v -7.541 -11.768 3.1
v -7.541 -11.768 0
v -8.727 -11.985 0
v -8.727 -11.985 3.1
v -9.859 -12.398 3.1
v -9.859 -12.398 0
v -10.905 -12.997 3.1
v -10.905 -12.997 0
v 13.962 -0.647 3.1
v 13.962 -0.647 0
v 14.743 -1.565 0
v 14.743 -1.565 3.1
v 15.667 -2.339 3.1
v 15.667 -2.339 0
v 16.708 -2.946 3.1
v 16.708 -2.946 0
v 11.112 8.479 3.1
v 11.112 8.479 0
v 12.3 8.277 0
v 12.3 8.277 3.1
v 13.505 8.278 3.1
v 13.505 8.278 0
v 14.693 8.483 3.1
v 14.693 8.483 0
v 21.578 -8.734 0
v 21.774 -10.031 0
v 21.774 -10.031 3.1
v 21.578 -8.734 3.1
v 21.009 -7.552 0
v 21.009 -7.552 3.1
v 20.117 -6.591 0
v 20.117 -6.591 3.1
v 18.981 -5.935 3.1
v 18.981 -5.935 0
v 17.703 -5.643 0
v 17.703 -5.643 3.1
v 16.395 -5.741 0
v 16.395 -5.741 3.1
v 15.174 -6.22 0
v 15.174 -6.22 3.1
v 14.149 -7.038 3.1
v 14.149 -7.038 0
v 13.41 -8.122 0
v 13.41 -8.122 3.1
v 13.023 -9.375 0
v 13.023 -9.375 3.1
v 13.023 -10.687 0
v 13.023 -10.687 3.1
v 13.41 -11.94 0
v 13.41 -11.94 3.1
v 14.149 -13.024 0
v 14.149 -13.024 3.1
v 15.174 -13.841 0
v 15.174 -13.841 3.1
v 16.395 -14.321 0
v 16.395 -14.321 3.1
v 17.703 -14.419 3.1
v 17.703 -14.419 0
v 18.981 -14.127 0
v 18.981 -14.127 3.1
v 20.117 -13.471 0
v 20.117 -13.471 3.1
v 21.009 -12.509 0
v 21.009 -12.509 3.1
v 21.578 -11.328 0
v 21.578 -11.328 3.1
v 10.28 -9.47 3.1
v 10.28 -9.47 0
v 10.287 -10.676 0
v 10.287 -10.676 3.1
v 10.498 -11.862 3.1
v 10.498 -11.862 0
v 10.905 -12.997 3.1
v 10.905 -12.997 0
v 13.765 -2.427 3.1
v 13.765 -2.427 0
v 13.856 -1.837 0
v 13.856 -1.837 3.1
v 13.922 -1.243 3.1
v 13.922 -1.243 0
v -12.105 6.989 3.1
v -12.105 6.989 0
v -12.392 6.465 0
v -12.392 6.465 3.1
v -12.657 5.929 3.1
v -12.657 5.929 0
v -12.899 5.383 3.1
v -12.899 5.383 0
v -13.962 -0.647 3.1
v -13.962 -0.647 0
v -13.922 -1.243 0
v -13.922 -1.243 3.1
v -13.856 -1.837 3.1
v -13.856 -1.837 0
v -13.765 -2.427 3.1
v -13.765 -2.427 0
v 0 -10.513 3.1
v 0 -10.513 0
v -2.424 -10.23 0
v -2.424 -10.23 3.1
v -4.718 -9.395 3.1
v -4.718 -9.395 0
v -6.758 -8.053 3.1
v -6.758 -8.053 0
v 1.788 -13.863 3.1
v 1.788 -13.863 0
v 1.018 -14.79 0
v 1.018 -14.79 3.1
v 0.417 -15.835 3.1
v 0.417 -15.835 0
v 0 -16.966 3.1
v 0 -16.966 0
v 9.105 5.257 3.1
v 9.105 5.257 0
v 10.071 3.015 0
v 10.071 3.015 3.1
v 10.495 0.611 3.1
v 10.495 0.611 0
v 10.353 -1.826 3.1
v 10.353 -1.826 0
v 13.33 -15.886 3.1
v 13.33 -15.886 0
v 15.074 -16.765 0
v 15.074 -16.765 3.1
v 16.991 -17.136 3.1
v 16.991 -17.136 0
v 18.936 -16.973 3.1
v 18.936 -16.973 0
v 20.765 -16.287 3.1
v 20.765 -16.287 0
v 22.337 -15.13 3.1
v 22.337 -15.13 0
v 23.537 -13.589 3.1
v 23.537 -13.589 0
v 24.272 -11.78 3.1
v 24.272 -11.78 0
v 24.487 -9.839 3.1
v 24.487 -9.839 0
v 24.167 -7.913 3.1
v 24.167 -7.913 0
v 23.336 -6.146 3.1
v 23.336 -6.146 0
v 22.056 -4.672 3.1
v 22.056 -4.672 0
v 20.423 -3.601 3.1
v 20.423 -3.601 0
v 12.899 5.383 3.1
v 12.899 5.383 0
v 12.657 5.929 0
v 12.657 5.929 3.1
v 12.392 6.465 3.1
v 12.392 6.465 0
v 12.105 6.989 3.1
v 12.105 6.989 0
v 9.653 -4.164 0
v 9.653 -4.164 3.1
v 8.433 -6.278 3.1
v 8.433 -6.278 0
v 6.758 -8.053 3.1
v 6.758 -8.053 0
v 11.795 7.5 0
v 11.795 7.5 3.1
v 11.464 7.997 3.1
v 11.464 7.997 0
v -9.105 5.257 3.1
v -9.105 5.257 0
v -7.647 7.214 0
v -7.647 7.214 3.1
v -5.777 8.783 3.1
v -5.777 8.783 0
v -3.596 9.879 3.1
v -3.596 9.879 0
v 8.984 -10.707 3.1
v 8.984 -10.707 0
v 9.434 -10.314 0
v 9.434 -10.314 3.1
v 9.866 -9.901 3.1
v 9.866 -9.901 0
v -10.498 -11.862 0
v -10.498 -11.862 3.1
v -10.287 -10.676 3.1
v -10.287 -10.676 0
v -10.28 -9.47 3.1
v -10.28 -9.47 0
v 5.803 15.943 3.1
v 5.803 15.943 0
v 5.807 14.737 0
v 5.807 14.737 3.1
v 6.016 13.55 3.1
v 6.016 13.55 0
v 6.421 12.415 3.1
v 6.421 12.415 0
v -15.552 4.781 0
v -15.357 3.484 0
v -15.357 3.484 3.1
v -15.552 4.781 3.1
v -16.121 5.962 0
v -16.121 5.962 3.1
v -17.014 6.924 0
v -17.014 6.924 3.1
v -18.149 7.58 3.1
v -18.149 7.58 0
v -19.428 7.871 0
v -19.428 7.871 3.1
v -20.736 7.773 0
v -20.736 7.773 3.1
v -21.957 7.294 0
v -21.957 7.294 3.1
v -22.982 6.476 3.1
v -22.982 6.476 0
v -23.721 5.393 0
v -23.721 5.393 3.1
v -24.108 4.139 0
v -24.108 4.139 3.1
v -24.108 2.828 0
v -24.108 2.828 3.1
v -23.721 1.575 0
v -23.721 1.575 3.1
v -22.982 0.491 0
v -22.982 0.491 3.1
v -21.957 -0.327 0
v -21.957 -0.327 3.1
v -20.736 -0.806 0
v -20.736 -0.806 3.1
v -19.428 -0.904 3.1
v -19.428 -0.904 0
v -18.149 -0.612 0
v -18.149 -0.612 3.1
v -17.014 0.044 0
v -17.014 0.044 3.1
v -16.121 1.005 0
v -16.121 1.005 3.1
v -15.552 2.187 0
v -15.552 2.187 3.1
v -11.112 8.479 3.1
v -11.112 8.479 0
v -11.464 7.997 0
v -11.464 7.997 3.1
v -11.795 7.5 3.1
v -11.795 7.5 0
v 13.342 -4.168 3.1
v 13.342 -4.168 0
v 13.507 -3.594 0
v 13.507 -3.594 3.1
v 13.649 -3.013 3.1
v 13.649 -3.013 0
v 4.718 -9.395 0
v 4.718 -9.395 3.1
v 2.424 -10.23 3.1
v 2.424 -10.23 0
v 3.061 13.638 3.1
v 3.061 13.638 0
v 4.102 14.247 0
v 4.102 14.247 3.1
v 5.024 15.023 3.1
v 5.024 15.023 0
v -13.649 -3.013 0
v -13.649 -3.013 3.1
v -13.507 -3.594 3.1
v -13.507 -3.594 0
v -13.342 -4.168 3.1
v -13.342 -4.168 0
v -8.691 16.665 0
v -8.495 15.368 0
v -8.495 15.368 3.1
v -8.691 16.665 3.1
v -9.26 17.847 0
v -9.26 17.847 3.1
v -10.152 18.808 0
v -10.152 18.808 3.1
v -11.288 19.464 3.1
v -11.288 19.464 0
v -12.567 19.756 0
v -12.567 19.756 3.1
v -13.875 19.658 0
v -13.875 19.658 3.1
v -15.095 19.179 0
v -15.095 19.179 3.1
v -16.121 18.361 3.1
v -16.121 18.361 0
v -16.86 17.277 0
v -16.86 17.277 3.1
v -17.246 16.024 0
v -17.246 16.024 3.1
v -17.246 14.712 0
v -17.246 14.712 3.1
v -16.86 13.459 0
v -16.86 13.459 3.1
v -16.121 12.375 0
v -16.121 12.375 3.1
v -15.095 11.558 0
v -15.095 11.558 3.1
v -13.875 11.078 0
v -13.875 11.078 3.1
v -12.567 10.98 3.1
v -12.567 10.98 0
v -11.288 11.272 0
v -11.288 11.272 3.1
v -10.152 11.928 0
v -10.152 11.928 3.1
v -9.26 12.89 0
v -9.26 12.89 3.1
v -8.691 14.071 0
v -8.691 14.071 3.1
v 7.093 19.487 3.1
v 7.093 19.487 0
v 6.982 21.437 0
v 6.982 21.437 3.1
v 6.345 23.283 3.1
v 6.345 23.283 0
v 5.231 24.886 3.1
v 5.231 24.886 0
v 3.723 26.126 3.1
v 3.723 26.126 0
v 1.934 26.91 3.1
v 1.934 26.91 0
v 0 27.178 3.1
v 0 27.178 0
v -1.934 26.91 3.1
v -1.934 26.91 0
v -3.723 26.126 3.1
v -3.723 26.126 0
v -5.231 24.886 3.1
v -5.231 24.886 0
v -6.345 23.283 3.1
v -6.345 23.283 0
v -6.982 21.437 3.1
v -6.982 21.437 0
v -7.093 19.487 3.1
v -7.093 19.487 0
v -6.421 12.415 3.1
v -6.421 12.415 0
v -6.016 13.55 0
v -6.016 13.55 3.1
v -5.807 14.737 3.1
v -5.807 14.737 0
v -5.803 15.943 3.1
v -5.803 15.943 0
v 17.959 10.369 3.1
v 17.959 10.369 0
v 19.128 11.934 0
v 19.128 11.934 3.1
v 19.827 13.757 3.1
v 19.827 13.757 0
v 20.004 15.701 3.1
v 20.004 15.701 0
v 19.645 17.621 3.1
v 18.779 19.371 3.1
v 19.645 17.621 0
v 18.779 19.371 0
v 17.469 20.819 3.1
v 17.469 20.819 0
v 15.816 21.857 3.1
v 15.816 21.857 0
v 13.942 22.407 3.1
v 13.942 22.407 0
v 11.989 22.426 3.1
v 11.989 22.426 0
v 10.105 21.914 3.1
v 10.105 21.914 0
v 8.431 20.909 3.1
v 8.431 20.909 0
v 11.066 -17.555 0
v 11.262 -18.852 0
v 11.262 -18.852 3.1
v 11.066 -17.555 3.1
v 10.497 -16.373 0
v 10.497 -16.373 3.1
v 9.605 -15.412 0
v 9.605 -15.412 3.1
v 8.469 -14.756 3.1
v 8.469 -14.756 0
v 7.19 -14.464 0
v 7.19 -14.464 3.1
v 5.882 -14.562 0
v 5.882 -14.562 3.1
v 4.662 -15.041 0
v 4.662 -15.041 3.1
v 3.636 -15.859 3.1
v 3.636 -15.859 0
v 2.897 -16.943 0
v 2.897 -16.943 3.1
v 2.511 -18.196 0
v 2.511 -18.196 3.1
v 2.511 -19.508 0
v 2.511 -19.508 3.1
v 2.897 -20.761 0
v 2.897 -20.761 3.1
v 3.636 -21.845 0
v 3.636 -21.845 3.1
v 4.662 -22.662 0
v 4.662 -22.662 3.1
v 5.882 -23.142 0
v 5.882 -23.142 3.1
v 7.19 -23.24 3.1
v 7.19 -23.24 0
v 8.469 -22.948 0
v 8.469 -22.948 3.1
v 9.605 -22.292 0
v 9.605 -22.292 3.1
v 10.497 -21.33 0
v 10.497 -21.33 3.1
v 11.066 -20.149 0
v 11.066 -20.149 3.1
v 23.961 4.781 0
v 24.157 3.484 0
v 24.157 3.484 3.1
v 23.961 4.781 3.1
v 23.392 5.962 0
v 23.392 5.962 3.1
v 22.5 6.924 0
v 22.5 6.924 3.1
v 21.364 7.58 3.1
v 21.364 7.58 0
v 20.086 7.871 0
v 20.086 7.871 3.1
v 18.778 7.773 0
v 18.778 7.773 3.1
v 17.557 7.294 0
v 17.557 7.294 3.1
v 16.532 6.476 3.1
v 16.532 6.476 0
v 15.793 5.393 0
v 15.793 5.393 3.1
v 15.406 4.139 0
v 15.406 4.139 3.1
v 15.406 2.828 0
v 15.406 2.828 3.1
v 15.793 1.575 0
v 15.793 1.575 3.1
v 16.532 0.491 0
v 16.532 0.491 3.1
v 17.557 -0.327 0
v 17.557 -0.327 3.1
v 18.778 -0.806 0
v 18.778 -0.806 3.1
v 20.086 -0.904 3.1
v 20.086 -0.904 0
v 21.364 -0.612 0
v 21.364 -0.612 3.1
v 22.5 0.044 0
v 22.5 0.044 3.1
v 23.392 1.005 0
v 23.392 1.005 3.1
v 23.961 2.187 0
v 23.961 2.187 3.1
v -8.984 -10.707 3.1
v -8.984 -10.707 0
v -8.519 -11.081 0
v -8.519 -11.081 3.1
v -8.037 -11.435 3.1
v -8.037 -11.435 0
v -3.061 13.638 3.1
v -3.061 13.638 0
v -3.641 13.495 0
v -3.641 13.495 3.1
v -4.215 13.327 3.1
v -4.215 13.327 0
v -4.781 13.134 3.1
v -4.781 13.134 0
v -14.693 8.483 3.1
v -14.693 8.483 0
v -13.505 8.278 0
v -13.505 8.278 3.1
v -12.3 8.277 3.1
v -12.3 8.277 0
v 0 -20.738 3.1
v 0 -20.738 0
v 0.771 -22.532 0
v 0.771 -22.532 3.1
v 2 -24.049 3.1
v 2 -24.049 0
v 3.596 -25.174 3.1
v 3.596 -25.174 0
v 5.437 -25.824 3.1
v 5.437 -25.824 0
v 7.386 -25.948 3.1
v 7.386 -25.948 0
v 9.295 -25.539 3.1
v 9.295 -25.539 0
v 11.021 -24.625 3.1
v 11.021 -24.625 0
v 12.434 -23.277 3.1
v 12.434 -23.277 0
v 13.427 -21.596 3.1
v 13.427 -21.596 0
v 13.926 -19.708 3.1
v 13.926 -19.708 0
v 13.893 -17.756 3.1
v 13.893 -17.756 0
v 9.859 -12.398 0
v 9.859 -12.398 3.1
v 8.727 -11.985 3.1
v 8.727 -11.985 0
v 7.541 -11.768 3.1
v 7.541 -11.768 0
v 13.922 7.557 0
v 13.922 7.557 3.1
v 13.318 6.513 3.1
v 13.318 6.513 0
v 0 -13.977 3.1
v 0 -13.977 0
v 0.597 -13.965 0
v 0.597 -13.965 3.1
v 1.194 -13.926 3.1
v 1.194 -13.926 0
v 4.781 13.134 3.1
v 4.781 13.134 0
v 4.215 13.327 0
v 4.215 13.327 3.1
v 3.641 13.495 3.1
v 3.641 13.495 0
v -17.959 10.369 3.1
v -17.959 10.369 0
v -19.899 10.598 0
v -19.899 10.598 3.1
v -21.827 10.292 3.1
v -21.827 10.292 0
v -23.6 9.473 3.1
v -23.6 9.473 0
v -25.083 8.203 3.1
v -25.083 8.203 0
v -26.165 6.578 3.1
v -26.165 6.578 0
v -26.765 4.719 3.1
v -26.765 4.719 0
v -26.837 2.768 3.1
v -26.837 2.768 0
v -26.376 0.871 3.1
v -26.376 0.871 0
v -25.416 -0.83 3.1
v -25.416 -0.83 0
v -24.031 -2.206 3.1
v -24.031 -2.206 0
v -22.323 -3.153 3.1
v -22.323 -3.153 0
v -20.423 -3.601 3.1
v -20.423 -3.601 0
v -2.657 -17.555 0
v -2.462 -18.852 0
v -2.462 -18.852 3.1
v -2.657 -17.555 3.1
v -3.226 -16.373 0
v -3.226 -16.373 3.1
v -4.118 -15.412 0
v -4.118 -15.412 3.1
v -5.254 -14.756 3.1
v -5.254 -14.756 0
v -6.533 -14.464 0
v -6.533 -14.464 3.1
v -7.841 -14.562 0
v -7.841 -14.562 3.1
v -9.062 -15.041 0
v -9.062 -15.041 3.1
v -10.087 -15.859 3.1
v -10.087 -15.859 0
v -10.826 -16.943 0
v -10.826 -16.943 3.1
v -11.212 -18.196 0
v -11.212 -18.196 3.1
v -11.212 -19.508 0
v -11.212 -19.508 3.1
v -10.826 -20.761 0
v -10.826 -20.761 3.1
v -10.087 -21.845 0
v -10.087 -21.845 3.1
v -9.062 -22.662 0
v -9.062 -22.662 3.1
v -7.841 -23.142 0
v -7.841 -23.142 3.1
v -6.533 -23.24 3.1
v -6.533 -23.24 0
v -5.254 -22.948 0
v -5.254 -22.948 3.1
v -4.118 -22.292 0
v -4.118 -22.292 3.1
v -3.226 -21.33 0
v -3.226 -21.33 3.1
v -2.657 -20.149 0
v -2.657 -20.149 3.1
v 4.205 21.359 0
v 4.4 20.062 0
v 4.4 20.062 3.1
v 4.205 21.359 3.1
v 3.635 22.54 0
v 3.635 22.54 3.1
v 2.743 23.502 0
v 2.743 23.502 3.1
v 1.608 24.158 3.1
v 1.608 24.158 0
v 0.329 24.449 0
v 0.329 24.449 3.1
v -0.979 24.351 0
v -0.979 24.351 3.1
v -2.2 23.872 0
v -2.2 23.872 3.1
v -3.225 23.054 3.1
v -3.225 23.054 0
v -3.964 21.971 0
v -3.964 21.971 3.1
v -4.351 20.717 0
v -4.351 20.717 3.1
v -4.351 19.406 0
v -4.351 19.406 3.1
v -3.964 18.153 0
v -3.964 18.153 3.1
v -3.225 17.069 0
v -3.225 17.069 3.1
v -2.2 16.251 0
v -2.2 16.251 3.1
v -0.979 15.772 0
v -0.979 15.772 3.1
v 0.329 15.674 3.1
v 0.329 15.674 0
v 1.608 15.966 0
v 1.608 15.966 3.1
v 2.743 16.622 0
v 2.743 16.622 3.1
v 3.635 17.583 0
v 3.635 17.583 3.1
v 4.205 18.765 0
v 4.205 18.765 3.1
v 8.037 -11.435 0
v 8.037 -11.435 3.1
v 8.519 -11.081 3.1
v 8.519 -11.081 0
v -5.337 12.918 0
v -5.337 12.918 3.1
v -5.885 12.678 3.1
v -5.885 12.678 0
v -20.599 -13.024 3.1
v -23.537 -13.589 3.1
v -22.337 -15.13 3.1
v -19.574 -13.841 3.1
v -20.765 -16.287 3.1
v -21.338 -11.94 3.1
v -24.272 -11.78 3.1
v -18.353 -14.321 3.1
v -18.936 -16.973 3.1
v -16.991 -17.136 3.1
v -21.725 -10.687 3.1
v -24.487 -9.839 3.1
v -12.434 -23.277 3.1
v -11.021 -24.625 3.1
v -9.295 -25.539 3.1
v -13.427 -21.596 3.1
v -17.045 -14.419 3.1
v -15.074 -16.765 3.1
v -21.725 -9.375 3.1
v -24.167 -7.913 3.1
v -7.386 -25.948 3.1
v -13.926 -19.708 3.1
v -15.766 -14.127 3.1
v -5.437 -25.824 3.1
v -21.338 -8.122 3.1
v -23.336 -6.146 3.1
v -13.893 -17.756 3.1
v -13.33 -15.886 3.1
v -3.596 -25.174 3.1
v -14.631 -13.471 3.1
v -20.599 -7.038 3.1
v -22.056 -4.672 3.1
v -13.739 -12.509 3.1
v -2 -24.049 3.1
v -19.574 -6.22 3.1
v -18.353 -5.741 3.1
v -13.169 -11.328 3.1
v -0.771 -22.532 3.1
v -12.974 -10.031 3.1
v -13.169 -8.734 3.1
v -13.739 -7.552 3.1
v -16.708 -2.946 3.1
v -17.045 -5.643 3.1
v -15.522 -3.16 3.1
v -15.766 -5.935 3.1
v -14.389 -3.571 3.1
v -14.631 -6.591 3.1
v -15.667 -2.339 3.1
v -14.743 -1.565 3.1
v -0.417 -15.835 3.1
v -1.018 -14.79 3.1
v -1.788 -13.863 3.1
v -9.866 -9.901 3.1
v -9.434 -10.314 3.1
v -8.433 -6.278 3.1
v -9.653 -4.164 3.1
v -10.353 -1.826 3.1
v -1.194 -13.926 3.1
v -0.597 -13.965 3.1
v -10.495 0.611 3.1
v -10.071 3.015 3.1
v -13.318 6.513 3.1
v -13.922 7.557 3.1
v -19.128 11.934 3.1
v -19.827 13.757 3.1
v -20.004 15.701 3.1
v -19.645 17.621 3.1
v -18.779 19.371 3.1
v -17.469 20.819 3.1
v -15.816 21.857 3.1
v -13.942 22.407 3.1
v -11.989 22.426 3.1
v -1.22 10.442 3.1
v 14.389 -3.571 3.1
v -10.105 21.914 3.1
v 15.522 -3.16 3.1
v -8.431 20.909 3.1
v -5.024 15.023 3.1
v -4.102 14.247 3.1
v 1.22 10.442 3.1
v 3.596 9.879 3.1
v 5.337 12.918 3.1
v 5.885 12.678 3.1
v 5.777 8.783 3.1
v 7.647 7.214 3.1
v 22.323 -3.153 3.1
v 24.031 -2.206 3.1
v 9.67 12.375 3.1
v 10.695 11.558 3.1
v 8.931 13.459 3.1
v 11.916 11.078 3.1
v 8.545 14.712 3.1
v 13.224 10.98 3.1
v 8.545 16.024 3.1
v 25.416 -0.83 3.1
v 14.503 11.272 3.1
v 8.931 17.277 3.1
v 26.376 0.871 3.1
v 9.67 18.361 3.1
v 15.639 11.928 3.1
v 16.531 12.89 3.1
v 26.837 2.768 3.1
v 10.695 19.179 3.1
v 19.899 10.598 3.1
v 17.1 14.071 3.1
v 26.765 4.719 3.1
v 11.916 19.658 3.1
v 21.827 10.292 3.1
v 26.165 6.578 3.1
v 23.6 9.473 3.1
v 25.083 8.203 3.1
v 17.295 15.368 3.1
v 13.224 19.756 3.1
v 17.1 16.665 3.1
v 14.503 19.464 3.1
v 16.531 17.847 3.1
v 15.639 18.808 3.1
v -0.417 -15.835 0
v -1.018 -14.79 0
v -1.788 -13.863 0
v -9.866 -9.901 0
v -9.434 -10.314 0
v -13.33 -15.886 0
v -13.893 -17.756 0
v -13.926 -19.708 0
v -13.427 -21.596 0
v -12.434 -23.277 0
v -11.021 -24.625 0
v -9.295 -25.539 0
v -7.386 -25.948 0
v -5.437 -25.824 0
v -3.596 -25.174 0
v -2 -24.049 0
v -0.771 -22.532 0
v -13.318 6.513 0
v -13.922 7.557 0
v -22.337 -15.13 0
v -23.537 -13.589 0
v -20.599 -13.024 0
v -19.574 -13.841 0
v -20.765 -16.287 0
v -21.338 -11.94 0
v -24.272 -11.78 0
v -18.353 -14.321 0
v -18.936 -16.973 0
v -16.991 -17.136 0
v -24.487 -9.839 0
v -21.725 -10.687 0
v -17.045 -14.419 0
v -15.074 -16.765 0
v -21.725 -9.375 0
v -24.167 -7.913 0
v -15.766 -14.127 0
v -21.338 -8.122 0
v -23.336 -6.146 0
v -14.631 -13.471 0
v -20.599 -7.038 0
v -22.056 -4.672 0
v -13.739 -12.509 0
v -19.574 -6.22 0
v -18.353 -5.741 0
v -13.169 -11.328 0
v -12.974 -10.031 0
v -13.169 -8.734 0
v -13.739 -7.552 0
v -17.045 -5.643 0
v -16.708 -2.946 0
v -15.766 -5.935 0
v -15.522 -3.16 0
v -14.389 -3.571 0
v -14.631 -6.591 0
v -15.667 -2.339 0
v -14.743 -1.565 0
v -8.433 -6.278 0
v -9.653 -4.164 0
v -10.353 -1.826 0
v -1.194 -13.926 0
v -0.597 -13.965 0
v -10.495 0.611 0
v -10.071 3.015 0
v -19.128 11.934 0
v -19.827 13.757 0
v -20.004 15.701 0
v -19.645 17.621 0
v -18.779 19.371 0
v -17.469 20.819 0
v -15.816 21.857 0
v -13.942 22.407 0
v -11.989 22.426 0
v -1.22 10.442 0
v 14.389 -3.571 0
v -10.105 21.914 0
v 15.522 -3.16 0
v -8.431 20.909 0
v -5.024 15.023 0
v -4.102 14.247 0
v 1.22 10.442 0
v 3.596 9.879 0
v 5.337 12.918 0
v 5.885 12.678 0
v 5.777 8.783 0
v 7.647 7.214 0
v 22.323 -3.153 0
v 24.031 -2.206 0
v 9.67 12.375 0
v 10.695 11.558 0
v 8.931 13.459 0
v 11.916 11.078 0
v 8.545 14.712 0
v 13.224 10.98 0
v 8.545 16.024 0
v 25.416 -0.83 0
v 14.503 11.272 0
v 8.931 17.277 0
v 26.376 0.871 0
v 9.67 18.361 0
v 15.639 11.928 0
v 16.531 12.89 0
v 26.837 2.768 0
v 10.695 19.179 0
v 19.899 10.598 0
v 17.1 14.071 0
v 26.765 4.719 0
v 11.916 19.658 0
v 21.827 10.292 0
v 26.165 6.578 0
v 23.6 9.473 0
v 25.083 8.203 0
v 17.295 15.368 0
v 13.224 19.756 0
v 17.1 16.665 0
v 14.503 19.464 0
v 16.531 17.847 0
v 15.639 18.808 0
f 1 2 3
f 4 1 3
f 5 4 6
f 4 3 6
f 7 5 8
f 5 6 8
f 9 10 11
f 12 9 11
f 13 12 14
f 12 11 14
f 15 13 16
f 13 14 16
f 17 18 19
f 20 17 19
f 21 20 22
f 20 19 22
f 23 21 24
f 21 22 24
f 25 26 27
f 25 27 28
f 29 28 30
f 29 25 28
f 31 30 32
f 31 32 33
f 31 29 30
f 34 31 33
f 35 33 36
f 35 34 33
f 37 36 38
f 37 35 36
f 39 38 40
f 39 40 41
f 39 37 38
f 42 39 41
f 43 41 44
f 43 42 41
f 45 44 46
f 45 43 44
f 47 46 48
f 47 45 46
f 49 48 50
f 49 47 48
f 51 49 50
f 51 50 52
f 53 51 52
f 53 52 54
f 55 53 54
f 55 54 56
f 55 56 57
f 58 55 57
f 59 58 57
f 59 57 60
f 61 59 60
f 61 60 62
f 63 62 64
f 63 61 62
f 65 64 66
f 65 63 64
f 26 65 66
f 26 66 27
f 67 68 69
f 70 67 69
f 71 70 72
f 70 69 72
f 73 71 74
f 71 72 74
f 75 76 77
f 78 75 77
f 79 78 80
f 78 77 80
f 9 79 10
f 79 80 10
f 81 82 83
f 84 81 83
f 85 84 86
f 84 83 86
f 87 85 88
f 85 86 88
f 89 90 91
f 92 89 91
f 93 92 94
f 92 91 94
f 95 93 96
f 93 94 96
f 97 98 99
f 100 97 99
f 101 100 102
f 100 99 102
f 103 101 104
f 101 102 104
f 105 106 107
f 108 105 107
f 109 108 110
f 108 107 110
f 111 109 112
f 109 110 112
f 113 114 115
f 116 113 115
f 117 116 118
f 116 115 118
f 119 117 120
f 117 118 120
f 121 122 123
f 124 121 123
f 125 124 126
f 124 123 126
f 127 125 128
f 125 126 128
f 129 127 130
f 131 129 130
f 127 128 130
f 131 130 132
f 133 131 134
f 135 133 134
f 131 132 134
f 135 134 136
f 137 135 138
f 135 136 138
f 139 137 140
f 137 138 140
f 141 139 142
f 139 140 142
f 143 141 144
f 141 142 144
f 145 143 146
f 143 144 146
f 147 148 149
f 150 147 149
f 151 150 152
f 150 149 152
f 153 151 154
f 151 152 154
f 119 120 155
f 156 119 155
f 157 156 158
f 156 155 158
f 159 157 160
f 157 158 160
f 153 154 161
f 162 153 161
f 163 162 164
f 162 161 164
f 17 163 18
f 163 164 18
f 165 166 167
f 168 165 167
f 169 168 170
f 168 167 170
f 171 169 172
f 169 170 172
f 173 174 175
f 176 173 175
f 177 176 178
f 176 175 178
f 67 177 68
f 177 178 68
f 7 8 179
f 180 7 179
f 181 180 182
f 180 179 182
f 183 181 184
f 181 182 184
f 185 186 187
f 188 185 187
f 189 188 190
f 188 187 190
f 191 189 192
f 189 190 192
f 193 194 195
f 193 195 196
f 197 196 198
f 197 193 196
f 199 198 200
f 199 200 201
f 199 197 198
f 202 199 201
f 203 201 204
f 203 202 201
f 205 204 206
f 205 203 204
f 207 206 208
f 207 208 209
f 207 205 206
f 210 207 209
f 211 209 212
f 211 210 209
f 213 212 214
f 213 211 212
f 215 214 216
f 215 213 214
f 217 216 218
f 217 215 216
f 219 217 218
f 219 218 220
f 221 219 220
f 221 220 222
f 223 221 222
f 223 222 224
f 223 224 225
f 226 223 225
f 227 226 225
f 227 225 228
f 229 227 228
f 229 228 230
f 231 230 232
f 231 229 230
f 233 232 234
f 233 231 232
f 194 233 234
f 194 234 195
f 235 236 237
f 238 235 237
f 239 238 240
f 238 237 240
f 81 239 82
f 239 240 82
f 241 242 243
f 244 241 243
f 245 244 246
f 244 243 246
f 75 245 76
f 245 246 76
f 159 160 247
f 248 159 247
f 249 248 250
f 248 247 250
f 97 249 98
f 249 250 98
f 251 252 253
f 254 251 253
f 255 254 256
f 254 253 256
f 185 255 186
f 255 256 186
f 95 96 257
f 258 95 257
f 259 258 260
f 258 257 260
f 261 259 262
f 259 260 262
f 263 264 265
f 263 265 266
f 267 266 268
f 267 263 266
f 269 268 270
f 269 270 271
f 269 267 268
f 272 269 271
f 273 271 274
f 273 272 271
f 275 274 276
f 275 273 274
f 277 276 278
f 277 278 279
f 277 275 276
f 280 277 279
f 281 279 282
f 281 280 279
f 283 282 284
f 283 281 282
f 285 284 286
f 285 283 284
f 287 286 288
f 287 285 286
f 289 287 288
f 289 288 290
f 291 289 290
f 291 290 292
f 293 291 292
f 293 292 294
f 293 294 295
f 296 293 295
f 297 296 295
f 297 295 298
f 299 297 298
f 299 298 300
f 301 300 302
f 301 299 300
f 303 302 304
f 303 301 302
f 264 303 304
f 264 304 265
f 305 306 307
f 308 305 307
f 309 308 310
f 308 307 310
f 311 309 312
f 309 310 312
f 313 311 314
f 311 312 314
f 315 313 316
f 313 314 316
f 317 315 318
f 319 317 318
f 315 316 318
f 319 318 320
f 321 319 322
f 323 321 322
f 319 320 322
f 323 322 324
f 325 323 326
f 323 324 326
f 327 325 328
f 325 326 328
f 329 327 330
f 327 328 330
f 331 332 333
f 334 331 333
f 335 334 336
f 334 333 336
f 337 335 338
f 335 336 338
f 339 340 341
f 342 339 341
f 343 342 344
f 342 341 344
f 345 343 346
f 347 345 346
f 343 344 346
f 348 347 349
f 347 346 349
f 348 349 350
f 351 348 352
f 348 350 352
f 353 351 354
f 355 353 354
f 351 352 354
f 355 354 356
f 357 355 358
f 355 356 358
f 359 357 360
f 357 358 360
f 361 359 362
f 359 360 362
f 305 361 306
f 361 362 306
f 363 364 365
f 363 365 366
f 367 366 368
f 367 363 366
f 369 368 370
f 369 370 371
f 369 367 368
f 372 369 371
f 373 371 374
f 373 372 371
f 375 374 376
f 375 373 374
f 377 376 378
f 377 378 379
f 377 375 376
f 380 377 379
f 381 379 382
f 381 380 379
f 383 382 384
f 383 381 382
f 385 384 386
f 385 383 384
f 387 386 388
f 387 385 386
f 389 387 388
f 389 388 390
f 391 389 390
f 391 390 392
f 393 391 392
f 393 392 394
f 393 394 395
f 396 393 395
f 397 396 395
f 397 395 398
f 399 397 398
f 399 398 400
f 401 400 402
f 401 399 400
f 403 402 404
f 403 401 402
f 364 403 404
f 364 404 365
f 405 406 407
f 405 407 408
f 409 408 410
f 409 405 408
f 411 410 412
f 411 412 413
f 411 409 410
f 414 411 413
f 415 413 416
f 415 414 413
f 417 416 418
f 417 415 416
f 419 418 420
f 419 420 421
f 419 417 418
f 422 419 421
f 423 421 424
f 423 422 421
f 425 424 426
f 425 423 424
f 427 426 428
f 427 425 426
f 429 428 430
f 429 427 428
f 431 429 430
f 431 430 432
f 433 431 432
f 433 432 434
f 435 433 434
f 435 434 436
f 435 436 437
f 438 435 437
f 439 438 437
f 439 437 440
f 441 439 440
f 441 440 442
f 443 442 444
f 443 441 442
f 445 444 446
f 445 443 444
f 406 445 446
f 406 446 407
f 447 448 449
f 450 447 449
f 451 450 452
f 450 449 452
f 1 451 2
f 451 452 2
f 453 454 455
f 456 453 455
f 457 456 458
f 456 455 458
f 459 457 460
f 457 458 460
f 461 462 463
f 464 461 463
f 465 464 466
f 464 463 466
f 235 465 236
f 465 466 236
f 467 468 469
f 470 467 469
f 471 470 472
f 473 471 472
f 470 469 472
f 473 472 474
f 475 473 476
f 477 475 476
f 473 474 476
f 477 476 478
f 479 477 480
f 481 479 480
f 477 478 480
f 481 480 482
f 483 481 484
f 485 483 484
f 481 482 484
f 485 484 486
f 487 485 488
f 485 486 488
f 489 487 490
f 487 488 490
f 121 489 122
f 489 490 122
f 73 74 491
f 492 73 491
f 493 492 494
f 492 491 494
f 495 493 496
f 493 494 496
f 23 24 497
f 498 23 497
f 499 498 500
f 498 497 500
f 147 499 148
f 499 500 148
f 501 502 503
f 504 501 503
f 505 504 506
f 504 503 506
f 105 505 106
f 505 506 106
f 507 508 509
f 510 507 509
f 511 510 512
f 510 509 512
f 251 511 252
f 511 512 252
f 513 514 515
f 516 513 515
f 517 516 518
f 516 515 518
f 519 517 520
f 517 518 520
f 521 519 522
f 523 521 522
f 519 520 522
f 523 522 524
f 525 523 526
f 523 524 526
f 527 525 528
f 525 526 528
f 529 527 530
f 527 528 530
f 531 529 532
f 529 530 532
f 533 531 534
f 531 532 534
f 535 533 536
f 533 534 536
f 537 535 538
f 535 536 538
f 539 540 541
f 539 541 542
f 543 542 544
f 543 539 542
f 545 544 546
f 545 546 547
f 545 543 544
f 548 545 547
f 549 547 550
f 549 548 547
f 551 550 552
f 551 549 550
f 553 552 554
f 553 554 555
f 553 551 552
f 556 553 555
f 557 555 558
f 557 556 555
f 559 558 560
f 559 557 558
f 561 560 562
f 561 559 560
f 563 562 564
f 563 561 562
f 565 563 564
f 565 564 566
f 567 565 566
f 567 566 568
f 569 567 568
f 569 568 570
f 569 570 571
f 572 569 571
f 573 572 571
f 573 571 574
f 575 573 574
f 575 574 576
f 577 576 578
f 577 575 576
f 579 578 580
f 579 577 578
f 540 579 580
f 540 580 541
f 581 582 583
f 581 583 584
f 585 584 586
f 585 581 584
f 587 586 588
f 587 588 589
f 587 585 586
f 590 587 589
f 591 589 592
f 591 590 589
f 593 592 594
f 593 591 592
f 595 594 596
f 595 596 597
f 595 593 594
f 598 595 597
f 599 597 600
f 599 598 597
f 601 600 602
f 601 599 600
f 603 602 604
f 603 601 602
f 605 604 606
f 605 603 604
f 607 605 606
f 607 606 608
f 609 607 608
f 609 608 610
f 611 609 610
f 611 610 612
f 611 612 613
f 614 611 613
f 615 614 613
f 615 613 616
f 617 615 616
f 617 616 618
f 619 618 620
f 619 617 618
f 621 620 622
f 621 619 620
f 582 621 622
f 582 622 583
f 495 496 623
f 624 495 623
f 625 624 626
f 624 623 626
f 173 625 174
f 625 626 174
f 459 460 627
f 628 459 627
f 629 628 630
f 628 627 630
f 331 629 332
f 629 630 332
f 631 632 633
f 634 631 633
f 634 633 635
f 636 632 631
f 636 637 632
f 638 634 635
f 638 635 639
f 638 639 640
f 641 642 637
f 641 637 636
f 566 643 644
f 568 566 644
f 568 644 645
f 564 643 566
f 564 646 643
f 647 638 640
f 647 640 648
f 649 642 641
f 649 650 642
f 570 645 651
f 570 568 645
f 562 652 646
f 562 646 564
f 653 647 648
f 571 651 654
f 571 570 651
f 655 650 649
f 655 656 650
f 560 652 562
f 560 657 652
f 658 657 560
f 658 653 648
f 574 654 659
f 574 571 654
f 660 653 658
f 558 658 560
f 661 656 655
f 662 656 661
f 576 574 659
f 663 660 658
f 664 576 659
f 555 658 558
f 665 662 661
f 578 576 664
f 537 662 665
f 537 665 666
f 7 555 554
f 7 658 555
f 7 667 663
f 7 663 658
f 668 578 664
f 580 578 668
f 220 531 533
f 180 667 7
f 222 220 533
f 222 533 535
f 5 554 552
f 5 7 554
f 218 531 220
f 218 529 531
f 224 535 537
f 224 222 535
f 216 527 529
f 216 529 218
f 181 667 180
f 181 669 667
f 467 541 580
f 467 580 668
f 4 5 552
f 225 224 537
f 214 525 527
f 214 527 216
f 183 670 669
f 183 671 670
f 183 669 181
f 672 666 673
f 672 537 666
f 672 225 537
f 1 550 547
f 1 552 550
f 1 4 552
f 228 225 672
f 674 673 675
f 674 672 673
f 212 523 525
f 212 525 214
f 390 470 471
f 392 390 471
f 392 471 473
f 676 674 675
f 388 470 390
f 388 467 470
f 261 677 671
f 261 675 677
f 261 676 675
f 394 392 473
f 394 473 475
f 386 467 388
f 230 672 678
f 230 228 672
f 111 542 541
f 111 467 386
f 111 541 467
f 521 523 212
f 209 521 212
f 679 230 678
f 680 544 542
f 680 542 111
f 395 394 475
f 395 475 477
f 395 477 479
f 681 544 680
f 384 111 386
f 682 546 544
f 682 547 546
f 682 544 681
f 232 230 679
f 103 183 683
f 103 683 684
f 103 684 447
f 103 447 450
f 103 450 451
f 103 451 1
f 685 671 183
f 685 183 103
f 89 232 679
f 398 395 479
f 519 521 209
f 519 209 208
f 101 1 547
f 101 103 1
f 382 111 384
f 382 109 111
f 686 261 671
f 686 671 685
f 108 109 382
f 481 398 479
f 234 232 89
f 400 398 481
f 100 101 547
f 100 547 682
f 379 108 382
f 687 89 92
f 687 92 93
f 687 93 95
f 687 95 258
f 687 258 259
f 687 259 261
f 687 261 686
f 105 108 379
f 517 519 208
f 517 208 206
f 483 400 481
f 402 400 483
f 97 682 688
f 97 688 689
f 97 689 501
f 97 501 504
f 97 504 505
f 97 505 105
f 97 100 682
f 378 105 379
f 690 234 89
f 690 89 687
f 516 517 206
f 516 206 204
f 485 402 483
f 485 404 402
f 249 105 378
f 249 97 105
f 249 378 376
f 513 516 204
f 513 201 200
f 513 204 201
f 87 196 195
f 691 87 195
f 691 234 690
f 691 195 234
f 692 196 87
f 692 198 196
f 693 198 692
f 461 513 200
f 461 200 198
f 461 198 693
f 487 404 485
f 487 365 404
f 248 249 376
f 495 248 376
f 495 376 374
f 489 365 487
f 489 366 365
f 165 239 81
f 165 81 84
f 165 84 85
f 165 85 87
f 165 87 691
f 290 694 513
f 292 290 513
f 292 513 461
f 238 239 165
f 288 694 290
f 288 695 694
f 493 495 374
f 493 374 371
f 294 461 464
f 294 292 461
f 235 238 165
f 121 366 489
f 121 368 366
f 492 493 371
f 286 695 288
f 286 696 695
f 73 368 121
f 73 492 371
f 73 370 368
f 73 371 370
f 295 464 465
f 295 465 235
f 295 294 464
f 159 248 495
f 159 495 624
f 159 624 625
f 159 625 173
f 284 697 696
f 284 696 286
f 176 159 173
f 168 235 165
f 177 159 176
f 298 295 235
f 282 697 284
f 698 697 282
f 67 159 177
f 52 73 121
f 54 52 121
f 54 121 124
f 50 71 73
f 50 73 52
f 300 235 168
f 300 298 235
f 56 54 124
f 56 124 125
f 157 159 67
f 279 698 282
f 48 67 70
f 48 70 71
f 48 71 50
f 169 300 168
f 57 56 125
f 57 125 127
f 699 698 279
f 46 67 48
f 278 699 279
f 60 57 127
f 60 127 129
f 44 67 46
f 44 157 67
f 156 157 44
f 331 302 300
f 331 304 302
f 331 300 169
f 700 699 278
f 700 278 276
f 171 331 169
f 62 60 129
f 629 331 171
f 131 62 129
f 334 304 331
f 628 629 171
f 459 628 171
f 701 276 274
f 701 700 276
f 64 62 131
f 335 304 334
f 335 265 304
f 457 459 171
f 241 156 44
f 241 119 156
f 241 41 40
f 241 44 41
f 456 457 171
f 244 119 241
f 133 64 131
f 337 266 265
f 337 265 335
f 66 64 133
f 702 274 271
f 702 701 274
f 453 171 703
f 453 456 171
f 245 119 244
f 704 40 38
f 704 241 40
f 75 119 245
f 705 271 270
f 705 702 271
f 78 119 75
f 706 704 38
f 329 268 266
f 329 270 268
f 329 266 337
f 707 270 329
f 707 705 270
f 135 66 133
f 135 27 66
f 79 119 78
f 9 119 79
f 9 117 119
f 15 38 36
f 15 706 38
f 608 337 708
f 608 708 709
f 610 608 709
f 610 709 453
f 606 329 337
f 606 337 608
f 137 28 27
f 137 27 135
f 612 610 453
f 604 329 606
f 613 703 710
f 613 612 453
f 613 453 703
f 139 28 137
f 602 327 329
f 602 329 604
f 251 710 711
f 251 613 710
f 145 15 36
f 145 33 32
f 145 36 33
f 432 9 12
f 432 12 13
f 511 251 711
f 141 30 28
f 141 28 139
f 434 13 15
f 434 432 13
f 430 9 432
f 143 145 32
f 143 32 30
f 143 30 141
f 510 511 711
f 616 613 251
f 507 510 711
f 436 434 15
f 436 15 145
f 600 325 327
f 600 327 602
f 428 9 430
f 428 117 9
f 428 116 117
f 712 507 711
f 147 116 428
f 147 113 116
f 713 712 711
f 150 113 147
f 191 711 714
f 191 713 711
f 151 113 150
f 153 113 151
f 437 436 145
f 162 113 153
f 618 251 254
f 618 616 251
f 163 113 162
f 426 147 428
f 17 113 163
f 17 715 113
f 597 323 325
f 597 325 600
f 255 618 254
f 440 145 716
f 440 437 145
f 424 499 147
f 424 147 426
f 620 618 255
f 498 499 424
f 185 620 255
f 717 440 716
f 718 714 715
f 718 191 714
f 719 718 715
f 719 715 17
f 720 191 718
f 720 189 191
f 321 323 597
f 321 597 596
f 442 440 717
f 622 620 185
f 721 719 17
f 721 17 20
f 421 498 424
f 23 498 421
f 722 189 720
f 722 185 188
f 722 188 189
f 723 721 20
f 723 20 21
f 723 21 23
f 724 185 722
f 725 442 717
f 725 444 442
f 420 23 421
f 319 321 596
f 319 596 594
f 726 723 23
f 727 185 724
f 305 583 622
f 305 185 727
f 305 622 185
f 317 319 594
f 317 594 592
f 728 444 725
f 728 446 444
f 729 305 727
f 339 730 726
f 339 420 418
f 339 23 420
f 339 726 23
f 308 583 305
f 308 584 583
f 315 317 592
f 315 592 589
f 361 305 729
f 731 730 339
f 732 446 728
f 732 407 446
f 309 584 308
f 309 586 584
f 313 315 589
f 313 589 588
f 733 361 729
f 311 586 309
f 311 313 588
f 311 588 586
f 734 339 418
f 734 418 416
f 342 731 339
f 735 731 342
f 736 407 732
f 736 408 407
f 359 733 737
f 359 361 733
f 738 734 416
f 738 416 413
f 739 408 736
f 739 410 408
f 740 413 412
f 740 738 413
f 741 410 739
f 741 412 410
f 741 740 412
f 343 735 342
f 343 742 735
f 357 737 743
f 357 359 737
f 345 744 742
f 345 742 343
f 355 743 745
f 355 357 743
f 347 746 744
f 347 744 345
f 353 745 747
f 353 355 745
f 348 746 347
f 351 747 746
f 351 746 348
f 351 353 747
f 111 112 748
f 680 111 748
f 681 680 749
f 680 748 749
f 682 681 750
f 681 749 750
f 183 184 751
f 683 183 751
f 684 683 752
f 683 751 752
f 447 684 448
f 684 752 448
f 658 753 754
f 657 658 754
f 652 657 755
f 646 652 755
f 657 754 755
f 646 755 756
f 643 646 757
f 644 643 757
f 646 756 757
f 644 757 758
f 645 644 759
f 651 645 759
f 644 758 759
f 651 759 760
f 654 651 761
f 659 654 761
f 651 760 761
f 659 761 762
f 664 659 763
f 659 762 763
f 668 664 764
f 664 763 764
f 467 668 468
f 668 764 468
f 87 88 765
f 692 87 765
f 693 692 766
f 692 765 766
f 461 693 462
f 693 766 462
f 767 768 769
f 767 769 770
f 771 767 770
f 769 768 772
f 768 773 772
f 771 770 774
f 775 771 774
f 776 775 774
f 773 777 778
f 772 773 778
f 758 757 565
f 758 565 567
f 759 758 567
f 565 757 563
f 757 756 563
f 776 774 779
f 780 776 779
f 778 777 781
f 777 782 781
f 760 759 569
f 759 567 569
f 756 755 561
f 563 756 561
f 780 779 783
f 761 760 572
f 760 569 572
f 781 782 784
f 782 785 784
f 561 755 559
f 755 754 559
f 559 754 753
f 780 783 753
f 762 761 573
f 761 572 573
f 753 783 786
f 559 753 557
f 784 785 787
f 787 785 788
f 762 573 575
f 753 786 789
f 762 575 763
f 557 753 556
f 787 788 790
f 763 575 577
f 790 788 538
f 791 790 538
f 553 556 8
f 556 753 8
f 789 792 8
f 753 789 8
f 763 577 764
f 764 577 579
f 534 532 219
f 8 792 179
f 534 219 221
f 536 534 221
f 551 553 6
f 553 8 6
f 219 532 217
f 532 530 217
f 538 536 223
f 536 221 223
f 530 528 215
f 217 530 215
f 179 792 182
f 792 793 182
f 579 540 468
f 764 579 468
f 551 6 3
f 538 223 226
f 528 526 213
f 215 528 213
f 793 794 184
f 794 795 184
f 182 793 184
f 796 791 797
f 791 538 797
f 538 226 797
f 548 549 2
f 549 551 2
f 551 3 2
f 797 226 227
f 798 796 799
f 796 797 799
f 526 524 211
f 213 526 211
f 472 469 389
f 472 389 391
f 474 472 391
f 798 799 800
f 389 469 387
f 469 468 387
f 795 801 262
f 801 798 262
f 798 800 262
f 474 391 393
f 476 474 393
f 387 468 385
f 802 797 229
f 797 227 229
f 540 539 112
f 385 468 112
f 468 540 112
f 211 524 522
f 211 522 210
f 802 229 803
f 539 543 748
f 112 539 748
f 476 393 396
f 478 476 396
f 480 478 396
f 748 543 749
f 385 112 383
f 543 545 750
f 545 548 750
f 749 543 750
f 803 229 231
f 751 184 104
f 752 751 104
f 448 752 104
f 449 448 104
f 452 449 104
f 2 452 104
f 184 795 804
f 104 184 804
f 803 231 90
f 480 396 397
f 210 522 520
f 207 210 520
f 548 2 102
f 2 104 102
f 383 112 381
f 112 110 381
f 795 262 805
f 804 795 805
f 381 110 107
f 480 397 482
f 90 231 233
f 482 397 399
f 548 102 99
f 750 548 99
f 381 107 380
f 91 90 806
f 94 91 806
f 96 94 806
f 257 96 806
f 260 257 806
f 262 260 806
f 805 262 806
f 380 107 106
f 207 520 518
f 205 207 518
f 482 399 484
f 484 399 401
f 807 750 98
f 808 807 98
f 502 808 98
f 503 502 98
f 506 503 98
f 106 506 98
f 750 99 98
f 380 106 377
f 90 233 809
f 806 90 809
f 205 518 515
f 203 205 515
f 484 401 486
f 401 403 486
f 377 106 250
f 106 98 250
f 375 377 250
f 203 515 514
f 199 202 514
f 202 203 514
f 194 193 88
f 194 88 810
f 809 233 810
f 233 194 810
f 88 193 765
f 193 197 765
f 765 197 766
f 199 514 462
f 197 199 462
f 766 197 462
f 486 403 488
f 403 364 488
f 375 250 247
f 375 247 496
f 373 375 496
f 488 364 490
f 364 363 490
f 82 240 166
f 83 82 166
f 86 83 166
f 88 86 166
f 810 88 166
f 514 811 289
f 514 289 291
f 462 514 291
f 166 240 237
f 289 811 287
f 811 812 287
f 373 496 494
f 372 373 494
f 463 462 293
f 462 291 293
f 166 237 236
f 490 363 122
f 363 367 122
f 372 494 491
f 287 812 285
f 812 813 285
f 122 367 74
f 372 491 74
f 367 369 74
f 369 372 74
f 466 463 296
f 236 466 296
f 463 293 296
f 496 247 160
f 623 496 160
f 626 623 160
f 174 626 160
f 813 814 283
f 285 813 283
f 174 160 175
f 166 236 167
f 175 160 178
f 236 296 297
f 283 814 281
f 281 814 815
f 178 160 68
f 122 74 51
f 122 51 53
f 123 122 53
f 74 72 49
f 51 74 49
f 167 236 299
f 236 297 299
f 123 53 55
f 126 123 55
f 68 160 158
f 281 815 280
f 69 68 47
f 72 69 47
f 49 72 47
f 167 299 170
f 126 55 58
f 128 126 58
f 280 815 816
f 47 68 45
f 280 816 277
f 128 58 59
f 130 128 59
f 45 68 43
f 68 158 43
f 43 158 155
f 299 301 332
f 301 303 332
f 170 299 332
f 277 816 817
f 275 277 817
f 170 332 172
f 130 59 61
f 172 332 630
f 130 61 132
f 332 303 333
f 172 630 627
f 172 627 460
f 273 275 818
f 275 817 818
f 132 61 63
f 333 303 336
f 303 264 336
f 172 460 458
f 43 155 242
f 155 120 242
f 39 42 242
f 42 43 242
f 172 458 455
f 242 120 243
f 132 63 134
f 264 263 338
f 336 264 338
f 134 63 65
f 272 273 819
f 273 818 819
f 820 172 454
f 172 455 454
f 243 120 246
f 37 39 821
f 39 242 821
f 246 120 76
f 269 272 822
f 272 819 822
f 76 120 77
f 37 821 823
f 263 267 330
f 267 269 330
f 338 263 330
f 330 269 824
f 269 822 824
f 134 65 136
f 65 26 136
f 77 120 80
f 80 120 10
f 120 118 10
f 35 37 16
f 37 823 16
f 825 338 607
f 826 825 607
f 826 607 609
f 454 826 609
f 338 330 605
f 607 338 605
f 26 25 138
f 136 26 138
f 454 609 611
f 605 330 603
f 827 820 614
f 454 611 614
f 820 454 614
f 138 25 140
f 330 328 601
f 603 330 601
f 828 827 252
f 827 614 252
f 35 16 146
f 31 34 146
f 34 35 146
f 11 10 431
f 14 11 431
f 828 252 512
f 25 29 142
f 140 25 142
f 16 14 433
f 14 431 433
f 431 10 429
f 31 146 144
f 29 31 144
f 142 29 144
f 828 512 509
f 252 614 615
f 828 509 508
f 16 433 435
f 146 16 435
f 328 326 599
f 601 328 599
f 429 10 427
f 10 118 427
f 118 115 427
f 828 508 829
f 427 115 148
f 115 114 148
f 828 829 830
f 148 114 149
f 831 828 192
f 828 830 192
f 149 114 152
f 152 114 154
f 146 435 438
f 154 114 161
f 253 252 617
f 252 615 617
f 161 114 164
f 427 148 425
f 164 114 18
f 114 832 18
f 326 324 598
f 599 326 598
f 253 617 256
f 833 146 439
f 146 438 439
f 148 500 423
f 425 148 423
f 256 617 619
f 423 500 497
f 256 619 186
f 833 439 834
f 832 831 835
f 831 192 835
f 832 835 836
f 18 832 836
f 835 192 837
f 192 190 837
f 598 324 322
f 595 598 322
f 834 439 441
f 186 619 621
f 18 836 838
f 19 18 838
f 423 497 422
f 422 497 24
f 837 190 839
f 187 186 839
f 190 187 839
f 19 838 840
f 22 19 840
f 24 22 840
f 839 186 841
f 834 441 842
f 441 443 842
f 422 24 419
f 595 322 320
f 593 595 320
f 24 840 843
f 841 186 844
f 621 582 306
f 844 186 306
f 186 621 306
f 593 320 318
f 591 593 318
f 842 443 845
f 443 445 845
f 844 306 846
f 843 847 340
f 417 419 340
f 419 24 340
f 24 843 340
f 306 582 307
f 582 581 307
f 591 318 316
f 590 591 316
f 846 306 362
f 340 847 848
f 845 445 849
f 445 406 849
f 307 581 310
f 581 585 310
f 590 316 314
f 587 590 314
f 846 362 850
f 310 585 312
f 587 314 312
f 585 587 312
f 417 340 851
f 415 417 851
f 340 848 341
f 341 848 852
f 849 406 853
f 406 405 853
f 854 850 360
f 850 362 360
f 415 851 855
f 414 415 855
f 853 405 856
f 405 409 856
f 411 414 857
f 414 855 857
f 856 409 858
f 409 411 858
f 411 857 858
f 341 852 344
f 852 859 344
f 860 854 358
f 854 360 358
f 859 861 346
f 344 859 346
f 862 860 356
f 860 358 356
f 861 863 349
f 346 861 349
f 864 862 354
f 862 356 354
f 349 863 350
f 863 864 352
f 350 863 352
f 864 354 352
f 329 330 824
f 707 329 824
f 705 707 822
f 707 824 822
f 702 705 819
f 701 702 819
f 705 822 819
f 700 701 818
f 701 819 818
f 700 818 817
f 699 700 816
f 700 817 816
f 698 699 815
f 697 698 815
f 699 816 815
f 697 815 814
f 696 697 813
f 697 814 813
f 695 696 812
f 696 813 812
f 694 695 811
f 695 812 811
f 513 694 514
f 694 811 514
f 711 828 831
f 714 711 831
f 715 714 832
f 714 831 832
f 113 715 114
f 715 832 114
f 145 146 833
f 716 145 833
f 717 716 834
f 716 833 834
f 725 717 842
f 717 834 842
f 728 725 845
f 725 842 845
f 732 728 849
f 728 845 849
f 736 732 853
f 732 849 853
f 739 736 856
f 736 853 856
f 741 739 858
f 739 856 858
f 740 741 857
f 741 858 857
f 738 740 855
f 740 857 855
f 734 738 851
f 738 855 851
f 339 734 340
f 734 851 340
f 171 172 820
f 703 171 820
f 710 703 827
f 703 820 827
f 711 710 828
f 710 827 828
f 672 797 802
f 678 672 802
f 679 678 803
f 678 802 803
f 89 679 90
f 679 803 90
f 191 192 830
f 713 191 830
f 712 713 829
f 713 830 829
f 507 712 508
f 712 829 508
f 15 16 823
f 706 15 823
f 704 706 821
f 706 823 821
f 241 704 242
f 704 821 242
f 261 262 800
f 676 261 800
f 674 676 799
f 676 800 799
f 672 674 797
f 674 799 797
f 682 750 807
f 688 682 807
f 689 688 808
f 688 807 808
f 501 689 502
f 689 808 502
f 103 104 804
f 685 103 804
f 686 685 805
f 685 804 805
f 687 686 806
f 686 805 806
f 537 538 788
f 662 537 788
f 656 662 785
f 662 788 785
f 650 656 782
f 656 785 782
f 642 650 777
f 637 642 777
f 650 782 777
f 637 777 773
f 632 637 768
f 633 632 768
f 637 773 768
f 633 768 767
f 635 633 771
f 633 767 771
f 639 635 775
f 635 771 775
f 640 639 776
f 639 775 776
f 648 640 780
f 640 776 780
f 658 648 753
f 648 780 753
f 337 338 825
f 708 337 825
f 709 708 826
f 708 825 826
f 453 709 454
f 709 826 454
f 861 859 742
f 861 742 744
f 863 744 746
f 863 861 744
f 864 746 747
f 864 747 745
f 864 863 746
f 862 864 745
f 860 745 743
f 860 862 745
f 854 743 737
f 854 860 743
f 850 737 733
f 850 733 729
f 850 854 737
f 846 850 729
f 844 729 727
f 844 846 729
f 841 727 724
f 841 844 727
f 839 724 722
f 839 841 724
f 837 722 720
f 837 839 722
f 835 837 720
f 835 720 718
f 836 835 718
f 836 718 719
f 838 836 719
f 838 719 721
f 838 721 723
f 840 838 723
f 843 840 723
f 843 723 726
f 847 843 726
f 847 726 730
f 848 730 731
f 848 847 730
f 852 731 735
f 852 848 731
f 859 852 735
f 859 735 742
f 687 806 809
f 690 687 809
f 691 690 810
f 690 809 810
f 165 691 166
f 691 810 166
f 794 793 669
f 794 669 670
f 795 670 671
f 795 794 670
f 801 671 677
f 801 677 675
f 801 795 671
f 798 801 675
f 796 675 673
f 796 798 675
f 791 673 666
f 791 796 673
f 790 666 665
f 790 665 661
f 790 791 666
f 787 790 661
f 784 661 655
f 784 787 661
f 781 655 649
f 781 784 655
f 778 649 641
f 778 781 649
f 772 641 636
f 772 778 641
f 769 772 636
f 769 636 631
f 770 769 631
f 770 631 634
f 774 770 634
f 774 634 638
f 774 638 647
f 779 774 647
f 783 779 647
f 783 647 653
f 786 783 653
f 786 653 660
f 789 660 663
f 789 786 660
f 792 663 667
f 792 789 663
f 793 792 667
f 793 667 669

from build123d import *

# Parameters (mm, degrees)
F0_R     = 4.4
F1_DEPTH = 3.1


with BuildPart() as f1:
    # F0 (on Top) → F1 (new body)
    with BuildSketch(Plane.XY):
        with BuildLine():
            ThreePointArc((20.42269, -3.601071), (26.764785, 4.719354), (17.959412, 10.368871))
            ThreePointArc((17.959412, 10.368871), (17.469473, 20.819307), (7.092726, 19.487104))
            ThreePointArc((7.092726, 19.487104), (0, 27.177675), (-7.092726, 19.487104))
            ThreePointArc((-7.092726, 19.487104), (-17.469473, 20.819307), (-17.959412, 10.368871))
            ThreePointArc((-17.959412, 10.368871), (-26.764785, 4.719354), (-20.42269, -3.601071))
            ThreePointArc((-20.42269, -3.601071), (-23.536557, -13.588838), (-13.329964, -15.886033))
            ThreePointArc((-13.329964, -15.886033), (-9.295312, -25.538661), (0, -20.737743))
            ThreePointArc((0, -20.737743), (9.295312, -25.538661), (13.329964, -15.886033))
            ThreePointArc((13.329964, -15.886033), (23.536557, -13.588838), (20.42269, -3.601071))
        make_face()
        with Locations((-6.86151, -18.851843)):
            Circle(F0_R, mode=Mode.SUBTRACT)
        with BuildLine():
            ThreePointArc((0, -16.965943), (-0.69539, -15.299956), (-1.787641, -13.862575))
            ThreePointArc((-1.787641, -13.862575), (-0.895661, -13.948635), (0, -13.977362))
            ThreePointArc((0, -13.977362), (0.895661, -13.948635), (1.787641, -13.862575))
            ThreePointArc((1.787641, -13.862575), (0.69539, -15.299956), (0, -16.965943))
        make_face(mode=Mode.SUBTRACT)
        with Locations((-17.373952, -10.030856)):
            Circle(F0_R, mode=Mode.SUBTRACT)
        with BuildLine():
            ThreePointArc((-16.708192, -2.946105), (-15.188268, -1.971984), (-13.962392, -0.646728))
            ThreePointArc((-13.962392, -0.646728), (-13.892254, -1.540101), (-13.765014, -2.427143))
            ThreePointArc((-13.765014, -2.427143), (-13.581194, -3.304209), (-13.34155, -4.167694))
            ThreePointArc((-13.34155, -4.167694), (-14.946762, -3.341635), (-16.708192, -2.946105))
        make_face(mode=Mode.SUBTRACT)
        with BuildLine():
            ThreePointArc((-10.905498, -12.996666), (-10.367322, -11.273458), (-10.280104, -9.470275))
            ThreePointArc((-10.280104, -9.470275), (-9.652127, -10.109555), (-8.984475, -10.70728))
            ThreePointArc((-8.984475, -10.70728), (-8.279894, -11.260995), (-7.541278, -11.768422))
            ThreePointArc((-7.541278, -11.768422), (-9.301923, -12.167434), (-10.905498, -12.996666))
        make_face(mode=Mode.SUBTRACT)
        with BuildLine():
            ThreePointArc((-3.595662, 9.878999), (0, 10.513011), (3.595662, 9.878999))
            ThreePointArc((3.595662, 9.878999), (6.757633, 8.053434), (9.104535, 5.256506))
            ThreePointArc((9.104535, 5.256506), (10.353295, 1.825565), (10.353295, -1.825565))
            ThreePointArc((10.353295, -1.825565), (9.104535, -5.256506), (6.757633, -8.053434))
            ThreePointArc((6.757633, -8.053434), (3.595662, -9.878999), (0, -10.513011))
            ThreePointArc((0, -10.513011), (-3.595662, -9.878999), (-6.757633, -8.053434))
            ThreePointArc((-6.757633, -8.053434), (-9.104535, -5.256506), (-10.353295, -1.825565))
            ThreePointArc((-10.353295, -1.825565), (-10.353295, 1.825565), (-9.104535, 5.256506))
            ThreePointArc((-9.104535, 5.256506), (-6.757633, 8.053434), (-3.595662, 9.878999))
        make_face(mode=Mode.SUBTRACT)
        with Locations((6.86151, -18.851843)):
            Circle(F0_R, mode=Mode.SUBTRACT)
        with BuildLine():
            ThreePointArc((10.905498, -12.996666), (9.301923, -12.167434), (7.541278, -11.768422))
            ThreePointArc((7.541278, -11.768422), (8.279894, -11.260995), (8.984475, -10.70728))
            ThreePointArc((8.984475, -10.70728), (9.652127, -10.109555), (10.280104, -9.470275))
            ThreePointArc((10.280104, -9.470275), (10.367322, -11.273458), (10.905498, -12.996666))
        make_face(mode=Mode.SUBTRACT)
        with Locations((17.373952, -10.030856)):
            Circle(F0_R, mode=Mode.SUBTRACT)
        with BuildLine():
            ThreePointArc((16.708192, -2.946105), (14.946762, -3.341635), (13.34155, -4.167694))
            ThreePointArc((13.34155, -4.167694), (13.581194, -3.304209), (13.765014, -2.427143))
            ThreePointArc((13.765014, -2.427143), (13.892254, -1.540101), (13.962392, -0.646728))
            ThreePointArc((13.962392, -0.646728), (15.188268, -1.971984), (16.708192, -2.946105))
        make_face(mode=Mode.SUBTRACT)
        with Locations((-19.756929, 3.48368)):
            Circle(F0_R, mode=Mode.SUBTRACT)
        with BuildLine():
            ThreePointArc((-14.692937, 8.482971), (-12.902456, 8.252203), (-11.111521, 8.47943))
            ThreePointArc((-11.111521, 8.47943), (-11.632042, 7.749983), (-12.10475, 6.988681))
            ThreePointArc((-12.10475, 6.988681), (-12.527703, 6.198652), (-12.899163, 5.383144))
            ThreePointArc((-12.899163, 5.383144), (-13.597845, 7.047753), (-14.692937, 8.482971))
        make_face(mode=Mode.SUBTRACT)
        with Locations((-12.89542, 15.368163)):
            Circle(F0_R, mode=Mode.SUBTRACT)
        with BuildLine():
            ThreePointArc((-5.802694, 15.942771), (-4.57944, 14.615093), (-3.061446, 13.637969))
            ThreePointArc((-3.061446, 13.637969), (-3.929068, 13.413764), (-4.780539, 13.134424))
            ThreePointArc((-4.780539, 13.134424), (-5.612361, 12.801095), (-6.421113, 12.41515))
            ThreePointArc((-6.421113, 12.41515), (-5.886346, 14.139418), (-5.802694, 15.942771))
        make_face(mode=Mode.SUBTRACT)
        with Locations((0, 20.061712)):
            Circle(F0_R, mode=Mode.SUBTRACT)
        with BuildLine():
            ThreePointArc((14.692937, 8.482971), (13.597845, 7.047753), (12.899163, 5.383144))
            ThreePointArc((12.899163, 5.383144), (12.527703, 6.198652), (12.10475, 6.988681))
            ThreePointArc((12.10475, 6.988681), (11.632042, 7.749983), (11.111521, 8.47943))
            ThreePointArc((11.111521, 8.47943), (12.902456, 8.252203), (14.692937, 8.482971))
        make_face(mode=Mode.SUBTRACT)
        with Locations((19.756929, 3.48368)):
            Circle(F0_R, mode=Mode.SUBTRACT)
        with BuildLine():
            ThreePointArc((4.780539, 13.134424), (3.929068, 13.413764), (3.061446, 13.637969))
            ThreePointArc((3.061446, 13.637969), (4.57944, 14.615093), (5.802694, 15.942771))
            ThreePointArc((5.802694, 15.942771), (5.886346, 14.139418), (6.421113, 12.41515))
            ThreePointArc((6.421113, 12.41515), (5.612361, 12.801095), (4.780539, 13.134424))
        make_face(mode=Mode.SUBTRACT)
        with Locations((12.89542, 15.368163)):
            Circle(F0_R, mode=Mode.SUBTRACT)
    extrude(amount=F1_DEPTH)


solid = f1.part
